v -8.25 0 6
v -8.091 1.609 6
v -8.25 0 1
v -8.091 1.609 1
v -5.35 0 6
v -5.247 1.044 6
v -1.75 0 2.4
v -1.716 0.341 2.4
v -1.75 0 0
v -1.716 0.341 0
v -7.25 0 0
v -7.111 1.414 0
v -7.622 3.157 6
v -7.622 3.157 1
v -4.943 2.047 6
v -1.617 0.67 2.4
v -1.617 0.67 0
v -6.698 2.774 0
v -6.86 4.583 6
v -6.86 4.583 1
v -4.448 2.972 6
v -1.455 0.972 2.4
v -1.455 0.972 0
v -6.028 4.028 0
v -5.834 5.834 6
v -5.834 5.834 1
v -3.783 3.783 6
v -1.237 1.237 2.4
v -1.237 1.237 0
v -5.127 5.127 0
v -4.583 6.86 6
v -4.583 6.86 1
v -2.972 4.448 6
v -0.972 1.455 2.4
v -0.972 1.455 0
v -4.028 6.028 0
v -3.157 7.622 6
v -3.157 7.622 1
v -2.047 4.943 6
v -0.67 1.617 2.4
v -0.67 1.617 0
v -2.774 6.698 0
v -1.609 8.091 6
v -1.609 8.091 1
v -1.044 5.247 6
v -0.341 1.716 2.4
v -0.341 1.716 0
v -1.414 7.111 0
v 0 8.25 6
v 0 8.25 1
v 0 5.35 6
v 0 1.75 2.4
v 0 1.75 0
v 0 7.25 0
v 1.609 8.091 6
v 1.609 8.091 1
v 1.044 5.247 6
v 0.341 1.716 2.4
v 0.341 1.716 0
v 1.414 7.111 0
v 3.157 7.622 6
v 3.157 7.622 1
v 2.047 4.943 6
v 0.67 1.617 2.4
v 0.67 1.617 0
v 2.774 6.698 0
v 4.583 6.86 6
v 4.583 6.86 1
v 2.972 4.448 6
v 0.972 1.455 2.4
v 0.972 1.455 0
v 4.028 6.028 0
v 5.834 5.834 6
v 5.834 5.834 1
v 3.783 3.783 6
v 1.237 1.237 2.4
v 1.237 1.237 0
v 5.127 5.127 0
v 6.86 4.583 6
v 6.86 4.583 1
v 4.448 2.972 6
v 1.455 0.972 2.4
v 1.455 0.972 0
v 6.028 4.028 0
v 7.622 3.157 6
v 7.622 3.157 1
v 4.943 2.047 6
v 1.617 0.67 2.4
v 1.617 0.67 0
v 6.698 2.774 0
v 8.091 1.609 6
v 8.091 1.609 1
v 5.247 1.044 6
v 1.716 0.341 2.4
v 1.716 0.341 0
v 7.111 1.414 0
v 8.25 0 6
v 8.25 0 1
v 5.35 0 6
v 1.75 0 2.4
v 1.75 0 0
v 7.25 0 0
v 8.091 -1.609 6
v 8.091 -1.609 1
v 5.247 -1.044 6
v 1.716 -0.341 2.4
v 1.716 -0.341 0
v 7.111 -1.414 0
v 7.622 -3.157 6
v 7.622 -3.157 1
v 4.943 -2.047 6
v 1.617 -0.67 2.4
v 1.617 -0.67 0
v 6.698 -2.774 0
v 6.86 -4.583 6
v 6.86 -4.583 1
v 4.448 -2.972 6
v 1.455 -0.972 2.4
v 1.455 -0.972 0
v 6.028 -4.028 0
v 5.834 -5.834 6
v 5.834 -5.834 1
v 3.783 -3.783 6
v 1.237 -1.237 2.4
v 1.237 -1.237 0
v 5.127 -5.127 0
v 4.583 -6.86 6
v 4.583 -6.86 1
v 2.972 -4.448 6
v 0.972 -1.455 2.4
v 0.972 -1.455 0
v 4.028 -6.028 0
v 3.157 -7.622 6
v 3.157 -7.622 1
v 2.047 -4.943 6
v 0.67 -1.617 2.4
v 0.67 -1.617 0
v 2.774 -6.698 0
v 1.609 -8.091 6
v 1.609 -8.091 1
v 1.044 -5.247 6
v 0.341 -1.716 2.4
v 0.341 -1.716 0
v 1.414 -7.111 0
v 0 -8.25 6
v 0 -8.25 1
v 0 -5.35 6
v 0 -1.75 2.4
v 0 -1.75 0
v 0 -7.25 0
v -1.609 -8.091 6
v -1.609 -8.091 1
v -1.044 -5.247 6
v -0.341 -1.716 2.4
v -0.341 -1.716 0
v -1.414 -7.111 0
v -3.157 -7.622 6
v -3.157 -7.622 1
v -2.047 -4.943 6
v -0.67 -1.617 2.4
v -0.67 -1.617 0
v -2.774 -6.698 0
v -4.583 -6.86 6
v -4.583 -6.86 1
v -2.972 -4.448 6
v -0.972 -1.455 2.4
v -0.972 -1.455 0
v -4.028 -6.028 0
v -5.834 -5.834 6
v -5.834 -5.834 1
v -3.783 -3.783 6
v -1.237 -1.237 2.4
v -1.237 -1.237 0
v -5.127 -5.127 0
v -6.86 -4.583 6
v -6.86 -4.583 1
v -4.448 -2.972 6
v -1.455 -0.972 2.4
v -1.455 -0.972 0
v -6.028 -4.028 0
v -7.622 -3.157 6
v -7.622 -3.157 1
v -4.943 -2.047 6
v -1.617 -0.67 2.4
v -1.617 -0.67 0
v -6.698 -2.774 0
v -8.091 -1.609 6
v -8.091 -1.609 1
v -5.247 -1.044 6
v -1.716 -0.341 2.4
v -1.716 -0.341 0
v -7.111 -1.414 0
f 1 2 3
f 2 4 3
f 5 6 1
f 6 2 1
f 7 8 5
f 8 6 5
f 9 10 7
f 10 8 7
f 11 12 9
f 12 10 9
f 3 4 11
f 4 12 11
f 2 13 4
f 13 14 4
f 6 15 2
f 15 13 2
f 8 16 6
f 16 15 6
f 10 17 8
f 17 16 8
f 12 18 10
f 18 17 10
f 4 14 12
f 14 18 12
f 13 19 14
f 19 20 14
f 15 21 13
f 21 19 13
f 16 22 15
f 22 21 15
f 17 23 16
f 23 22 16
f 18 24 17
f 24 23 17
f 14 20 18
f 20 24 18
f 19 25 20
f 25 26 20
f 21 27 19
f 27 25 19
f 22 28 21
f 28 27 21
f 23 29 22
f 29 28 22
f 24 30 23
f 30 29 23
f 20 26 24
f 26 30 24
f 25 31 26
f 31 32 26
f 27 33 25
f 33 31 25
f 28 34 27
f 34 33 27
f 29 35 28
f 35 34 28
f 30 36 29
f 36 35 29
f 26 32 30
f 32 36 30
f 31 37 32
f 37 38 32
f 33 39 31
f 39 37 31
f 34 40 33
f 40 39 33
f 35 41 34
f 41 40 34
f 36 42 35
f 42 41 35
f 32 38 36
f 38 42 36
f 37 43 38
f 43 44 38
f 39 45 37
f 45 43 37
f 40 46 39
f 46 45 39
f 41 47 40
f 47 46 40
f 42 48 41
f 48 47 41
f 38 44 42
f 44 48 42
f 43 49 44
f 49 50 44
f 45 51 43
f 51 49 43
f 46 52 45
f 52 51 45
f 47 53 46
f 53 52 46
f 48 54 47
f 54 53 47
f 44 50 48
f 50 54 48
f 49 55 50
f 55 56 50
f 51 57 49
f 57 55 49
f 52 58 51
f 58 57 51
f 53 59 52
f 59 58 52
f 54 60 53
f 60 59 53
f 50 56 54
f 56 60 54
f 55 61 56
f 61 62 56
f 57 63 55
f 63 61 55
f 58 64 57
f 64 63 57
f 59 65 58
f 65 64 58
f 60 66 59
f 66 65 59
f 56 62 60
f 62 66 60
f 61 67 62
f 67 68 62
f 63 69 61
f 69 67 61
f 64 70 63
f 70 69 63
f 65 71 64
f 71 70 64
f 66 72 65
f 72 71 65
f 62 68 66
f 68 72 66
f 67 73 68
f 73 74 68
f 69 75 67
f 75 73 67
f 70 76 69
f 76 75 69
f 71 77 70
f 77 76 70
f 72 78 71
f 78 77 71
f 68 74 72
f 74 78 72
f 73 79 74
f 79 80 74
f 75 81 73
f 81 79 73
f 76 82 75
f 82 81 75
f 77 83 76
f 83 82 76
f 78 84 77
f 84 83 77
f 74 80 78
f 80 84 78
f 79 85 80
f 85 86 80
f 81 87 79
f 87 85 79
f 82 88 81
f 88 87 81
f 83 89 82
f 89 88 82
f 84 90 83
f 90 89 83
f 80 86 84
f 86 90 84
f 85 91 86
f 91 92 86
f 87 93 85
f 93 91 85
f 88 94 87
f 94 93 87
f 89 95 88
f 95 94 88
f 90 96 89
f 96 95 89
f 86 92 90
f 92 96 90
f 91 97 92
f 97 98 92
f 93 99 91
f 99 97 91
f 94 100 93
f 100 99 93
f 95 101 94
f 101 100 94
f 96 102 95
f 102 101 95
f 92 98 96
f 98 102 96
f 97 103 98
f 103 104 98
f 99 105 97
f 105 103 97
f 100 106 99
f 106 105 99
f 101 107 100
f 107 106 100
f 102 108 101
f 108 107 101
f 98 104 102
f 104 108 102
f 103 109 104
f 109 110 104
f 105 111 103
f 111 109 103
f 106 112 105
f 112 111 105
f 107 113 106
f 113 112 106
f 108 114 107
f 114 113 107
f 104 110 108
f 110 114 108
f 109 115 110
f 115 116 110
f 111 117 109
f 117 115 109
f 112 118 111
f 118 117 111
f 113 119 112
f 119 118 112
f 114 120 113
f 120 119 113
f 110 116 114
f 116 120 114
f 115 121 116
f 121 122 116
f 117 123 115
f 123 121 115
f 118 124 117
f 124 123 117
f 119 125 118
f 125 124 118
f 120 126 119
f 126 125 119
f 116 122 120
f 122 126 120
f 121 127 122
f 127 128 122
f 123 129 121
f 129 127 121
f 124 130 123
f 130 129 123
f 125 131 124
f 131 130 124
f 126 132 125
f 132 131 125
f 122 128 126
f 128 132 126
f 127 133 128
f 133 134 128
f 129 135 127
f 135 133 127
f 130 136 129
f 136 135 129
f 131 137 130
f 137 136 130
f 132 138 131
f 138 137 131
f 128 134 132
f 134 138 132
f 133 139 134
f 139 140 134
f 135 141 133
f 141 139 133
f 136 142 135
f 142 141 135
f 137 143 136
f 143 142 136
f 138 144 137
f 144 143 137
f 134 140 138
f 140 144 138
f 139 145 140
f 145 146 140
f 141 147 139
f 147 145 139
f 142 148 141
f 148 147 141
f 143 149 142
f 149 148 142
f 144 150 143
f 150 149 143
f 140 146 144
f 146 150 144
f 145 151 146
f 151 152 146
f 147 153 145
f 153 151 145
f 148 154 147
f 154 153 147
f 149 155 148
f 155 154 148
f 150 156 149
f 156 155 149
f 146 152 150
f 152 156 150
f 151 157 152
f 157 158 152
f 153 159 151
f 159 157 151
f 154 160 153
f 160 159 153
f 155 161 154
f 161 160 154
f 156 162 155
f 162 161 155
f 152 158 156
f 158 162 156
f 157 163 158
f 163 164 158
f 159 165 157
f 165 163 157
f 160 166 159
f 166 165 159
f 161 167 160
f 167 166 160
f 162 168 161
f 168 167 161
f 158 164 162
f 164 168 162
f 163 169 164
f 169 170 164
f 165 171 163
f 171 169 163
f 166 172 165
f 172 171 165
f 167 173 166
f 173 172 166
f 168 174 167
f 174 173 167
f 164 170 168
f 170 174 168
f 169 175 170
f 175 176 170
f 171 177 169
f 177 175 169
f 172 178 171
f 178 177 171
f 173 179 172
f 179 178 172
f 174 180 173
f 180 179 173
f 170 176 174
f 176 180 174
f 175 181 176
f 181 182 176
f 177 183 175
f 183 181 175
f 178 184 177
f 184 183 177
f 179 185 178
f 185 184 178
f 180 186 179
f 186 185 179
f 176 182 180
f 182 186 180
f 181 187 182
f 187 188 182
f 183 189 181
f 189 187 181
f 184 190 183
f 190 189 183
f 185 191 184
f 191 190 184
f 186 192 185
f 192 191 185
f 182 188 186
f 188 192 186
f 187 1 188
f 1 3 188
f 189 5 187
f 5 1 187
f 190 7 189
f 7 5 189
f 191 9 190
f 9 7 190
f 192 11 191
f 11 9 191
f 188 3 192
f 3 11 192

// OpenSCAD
$fn = 32;

// ----------------------------------------------------------------------
// Form washer: countersunk washer, 16.5 mm outside, 3.5 mm bore
// ----------------------------------------------------------------------

// --- parameters (mm) ---
revolve_angle = 360;      // full turn around the Z axis
profile_points = 6;       // points of the closed outline

profile = [[1.75, 0], [7.25, 0], [8.25, 1], [8.25, 6], [5.35, 6], [1.75, 2.4]];  // single closed polygon, 6 points, counter clockwise

// --- the one profile operation ---
rotate_extrude(angle = revolve_angle) polygon(points = profile);
